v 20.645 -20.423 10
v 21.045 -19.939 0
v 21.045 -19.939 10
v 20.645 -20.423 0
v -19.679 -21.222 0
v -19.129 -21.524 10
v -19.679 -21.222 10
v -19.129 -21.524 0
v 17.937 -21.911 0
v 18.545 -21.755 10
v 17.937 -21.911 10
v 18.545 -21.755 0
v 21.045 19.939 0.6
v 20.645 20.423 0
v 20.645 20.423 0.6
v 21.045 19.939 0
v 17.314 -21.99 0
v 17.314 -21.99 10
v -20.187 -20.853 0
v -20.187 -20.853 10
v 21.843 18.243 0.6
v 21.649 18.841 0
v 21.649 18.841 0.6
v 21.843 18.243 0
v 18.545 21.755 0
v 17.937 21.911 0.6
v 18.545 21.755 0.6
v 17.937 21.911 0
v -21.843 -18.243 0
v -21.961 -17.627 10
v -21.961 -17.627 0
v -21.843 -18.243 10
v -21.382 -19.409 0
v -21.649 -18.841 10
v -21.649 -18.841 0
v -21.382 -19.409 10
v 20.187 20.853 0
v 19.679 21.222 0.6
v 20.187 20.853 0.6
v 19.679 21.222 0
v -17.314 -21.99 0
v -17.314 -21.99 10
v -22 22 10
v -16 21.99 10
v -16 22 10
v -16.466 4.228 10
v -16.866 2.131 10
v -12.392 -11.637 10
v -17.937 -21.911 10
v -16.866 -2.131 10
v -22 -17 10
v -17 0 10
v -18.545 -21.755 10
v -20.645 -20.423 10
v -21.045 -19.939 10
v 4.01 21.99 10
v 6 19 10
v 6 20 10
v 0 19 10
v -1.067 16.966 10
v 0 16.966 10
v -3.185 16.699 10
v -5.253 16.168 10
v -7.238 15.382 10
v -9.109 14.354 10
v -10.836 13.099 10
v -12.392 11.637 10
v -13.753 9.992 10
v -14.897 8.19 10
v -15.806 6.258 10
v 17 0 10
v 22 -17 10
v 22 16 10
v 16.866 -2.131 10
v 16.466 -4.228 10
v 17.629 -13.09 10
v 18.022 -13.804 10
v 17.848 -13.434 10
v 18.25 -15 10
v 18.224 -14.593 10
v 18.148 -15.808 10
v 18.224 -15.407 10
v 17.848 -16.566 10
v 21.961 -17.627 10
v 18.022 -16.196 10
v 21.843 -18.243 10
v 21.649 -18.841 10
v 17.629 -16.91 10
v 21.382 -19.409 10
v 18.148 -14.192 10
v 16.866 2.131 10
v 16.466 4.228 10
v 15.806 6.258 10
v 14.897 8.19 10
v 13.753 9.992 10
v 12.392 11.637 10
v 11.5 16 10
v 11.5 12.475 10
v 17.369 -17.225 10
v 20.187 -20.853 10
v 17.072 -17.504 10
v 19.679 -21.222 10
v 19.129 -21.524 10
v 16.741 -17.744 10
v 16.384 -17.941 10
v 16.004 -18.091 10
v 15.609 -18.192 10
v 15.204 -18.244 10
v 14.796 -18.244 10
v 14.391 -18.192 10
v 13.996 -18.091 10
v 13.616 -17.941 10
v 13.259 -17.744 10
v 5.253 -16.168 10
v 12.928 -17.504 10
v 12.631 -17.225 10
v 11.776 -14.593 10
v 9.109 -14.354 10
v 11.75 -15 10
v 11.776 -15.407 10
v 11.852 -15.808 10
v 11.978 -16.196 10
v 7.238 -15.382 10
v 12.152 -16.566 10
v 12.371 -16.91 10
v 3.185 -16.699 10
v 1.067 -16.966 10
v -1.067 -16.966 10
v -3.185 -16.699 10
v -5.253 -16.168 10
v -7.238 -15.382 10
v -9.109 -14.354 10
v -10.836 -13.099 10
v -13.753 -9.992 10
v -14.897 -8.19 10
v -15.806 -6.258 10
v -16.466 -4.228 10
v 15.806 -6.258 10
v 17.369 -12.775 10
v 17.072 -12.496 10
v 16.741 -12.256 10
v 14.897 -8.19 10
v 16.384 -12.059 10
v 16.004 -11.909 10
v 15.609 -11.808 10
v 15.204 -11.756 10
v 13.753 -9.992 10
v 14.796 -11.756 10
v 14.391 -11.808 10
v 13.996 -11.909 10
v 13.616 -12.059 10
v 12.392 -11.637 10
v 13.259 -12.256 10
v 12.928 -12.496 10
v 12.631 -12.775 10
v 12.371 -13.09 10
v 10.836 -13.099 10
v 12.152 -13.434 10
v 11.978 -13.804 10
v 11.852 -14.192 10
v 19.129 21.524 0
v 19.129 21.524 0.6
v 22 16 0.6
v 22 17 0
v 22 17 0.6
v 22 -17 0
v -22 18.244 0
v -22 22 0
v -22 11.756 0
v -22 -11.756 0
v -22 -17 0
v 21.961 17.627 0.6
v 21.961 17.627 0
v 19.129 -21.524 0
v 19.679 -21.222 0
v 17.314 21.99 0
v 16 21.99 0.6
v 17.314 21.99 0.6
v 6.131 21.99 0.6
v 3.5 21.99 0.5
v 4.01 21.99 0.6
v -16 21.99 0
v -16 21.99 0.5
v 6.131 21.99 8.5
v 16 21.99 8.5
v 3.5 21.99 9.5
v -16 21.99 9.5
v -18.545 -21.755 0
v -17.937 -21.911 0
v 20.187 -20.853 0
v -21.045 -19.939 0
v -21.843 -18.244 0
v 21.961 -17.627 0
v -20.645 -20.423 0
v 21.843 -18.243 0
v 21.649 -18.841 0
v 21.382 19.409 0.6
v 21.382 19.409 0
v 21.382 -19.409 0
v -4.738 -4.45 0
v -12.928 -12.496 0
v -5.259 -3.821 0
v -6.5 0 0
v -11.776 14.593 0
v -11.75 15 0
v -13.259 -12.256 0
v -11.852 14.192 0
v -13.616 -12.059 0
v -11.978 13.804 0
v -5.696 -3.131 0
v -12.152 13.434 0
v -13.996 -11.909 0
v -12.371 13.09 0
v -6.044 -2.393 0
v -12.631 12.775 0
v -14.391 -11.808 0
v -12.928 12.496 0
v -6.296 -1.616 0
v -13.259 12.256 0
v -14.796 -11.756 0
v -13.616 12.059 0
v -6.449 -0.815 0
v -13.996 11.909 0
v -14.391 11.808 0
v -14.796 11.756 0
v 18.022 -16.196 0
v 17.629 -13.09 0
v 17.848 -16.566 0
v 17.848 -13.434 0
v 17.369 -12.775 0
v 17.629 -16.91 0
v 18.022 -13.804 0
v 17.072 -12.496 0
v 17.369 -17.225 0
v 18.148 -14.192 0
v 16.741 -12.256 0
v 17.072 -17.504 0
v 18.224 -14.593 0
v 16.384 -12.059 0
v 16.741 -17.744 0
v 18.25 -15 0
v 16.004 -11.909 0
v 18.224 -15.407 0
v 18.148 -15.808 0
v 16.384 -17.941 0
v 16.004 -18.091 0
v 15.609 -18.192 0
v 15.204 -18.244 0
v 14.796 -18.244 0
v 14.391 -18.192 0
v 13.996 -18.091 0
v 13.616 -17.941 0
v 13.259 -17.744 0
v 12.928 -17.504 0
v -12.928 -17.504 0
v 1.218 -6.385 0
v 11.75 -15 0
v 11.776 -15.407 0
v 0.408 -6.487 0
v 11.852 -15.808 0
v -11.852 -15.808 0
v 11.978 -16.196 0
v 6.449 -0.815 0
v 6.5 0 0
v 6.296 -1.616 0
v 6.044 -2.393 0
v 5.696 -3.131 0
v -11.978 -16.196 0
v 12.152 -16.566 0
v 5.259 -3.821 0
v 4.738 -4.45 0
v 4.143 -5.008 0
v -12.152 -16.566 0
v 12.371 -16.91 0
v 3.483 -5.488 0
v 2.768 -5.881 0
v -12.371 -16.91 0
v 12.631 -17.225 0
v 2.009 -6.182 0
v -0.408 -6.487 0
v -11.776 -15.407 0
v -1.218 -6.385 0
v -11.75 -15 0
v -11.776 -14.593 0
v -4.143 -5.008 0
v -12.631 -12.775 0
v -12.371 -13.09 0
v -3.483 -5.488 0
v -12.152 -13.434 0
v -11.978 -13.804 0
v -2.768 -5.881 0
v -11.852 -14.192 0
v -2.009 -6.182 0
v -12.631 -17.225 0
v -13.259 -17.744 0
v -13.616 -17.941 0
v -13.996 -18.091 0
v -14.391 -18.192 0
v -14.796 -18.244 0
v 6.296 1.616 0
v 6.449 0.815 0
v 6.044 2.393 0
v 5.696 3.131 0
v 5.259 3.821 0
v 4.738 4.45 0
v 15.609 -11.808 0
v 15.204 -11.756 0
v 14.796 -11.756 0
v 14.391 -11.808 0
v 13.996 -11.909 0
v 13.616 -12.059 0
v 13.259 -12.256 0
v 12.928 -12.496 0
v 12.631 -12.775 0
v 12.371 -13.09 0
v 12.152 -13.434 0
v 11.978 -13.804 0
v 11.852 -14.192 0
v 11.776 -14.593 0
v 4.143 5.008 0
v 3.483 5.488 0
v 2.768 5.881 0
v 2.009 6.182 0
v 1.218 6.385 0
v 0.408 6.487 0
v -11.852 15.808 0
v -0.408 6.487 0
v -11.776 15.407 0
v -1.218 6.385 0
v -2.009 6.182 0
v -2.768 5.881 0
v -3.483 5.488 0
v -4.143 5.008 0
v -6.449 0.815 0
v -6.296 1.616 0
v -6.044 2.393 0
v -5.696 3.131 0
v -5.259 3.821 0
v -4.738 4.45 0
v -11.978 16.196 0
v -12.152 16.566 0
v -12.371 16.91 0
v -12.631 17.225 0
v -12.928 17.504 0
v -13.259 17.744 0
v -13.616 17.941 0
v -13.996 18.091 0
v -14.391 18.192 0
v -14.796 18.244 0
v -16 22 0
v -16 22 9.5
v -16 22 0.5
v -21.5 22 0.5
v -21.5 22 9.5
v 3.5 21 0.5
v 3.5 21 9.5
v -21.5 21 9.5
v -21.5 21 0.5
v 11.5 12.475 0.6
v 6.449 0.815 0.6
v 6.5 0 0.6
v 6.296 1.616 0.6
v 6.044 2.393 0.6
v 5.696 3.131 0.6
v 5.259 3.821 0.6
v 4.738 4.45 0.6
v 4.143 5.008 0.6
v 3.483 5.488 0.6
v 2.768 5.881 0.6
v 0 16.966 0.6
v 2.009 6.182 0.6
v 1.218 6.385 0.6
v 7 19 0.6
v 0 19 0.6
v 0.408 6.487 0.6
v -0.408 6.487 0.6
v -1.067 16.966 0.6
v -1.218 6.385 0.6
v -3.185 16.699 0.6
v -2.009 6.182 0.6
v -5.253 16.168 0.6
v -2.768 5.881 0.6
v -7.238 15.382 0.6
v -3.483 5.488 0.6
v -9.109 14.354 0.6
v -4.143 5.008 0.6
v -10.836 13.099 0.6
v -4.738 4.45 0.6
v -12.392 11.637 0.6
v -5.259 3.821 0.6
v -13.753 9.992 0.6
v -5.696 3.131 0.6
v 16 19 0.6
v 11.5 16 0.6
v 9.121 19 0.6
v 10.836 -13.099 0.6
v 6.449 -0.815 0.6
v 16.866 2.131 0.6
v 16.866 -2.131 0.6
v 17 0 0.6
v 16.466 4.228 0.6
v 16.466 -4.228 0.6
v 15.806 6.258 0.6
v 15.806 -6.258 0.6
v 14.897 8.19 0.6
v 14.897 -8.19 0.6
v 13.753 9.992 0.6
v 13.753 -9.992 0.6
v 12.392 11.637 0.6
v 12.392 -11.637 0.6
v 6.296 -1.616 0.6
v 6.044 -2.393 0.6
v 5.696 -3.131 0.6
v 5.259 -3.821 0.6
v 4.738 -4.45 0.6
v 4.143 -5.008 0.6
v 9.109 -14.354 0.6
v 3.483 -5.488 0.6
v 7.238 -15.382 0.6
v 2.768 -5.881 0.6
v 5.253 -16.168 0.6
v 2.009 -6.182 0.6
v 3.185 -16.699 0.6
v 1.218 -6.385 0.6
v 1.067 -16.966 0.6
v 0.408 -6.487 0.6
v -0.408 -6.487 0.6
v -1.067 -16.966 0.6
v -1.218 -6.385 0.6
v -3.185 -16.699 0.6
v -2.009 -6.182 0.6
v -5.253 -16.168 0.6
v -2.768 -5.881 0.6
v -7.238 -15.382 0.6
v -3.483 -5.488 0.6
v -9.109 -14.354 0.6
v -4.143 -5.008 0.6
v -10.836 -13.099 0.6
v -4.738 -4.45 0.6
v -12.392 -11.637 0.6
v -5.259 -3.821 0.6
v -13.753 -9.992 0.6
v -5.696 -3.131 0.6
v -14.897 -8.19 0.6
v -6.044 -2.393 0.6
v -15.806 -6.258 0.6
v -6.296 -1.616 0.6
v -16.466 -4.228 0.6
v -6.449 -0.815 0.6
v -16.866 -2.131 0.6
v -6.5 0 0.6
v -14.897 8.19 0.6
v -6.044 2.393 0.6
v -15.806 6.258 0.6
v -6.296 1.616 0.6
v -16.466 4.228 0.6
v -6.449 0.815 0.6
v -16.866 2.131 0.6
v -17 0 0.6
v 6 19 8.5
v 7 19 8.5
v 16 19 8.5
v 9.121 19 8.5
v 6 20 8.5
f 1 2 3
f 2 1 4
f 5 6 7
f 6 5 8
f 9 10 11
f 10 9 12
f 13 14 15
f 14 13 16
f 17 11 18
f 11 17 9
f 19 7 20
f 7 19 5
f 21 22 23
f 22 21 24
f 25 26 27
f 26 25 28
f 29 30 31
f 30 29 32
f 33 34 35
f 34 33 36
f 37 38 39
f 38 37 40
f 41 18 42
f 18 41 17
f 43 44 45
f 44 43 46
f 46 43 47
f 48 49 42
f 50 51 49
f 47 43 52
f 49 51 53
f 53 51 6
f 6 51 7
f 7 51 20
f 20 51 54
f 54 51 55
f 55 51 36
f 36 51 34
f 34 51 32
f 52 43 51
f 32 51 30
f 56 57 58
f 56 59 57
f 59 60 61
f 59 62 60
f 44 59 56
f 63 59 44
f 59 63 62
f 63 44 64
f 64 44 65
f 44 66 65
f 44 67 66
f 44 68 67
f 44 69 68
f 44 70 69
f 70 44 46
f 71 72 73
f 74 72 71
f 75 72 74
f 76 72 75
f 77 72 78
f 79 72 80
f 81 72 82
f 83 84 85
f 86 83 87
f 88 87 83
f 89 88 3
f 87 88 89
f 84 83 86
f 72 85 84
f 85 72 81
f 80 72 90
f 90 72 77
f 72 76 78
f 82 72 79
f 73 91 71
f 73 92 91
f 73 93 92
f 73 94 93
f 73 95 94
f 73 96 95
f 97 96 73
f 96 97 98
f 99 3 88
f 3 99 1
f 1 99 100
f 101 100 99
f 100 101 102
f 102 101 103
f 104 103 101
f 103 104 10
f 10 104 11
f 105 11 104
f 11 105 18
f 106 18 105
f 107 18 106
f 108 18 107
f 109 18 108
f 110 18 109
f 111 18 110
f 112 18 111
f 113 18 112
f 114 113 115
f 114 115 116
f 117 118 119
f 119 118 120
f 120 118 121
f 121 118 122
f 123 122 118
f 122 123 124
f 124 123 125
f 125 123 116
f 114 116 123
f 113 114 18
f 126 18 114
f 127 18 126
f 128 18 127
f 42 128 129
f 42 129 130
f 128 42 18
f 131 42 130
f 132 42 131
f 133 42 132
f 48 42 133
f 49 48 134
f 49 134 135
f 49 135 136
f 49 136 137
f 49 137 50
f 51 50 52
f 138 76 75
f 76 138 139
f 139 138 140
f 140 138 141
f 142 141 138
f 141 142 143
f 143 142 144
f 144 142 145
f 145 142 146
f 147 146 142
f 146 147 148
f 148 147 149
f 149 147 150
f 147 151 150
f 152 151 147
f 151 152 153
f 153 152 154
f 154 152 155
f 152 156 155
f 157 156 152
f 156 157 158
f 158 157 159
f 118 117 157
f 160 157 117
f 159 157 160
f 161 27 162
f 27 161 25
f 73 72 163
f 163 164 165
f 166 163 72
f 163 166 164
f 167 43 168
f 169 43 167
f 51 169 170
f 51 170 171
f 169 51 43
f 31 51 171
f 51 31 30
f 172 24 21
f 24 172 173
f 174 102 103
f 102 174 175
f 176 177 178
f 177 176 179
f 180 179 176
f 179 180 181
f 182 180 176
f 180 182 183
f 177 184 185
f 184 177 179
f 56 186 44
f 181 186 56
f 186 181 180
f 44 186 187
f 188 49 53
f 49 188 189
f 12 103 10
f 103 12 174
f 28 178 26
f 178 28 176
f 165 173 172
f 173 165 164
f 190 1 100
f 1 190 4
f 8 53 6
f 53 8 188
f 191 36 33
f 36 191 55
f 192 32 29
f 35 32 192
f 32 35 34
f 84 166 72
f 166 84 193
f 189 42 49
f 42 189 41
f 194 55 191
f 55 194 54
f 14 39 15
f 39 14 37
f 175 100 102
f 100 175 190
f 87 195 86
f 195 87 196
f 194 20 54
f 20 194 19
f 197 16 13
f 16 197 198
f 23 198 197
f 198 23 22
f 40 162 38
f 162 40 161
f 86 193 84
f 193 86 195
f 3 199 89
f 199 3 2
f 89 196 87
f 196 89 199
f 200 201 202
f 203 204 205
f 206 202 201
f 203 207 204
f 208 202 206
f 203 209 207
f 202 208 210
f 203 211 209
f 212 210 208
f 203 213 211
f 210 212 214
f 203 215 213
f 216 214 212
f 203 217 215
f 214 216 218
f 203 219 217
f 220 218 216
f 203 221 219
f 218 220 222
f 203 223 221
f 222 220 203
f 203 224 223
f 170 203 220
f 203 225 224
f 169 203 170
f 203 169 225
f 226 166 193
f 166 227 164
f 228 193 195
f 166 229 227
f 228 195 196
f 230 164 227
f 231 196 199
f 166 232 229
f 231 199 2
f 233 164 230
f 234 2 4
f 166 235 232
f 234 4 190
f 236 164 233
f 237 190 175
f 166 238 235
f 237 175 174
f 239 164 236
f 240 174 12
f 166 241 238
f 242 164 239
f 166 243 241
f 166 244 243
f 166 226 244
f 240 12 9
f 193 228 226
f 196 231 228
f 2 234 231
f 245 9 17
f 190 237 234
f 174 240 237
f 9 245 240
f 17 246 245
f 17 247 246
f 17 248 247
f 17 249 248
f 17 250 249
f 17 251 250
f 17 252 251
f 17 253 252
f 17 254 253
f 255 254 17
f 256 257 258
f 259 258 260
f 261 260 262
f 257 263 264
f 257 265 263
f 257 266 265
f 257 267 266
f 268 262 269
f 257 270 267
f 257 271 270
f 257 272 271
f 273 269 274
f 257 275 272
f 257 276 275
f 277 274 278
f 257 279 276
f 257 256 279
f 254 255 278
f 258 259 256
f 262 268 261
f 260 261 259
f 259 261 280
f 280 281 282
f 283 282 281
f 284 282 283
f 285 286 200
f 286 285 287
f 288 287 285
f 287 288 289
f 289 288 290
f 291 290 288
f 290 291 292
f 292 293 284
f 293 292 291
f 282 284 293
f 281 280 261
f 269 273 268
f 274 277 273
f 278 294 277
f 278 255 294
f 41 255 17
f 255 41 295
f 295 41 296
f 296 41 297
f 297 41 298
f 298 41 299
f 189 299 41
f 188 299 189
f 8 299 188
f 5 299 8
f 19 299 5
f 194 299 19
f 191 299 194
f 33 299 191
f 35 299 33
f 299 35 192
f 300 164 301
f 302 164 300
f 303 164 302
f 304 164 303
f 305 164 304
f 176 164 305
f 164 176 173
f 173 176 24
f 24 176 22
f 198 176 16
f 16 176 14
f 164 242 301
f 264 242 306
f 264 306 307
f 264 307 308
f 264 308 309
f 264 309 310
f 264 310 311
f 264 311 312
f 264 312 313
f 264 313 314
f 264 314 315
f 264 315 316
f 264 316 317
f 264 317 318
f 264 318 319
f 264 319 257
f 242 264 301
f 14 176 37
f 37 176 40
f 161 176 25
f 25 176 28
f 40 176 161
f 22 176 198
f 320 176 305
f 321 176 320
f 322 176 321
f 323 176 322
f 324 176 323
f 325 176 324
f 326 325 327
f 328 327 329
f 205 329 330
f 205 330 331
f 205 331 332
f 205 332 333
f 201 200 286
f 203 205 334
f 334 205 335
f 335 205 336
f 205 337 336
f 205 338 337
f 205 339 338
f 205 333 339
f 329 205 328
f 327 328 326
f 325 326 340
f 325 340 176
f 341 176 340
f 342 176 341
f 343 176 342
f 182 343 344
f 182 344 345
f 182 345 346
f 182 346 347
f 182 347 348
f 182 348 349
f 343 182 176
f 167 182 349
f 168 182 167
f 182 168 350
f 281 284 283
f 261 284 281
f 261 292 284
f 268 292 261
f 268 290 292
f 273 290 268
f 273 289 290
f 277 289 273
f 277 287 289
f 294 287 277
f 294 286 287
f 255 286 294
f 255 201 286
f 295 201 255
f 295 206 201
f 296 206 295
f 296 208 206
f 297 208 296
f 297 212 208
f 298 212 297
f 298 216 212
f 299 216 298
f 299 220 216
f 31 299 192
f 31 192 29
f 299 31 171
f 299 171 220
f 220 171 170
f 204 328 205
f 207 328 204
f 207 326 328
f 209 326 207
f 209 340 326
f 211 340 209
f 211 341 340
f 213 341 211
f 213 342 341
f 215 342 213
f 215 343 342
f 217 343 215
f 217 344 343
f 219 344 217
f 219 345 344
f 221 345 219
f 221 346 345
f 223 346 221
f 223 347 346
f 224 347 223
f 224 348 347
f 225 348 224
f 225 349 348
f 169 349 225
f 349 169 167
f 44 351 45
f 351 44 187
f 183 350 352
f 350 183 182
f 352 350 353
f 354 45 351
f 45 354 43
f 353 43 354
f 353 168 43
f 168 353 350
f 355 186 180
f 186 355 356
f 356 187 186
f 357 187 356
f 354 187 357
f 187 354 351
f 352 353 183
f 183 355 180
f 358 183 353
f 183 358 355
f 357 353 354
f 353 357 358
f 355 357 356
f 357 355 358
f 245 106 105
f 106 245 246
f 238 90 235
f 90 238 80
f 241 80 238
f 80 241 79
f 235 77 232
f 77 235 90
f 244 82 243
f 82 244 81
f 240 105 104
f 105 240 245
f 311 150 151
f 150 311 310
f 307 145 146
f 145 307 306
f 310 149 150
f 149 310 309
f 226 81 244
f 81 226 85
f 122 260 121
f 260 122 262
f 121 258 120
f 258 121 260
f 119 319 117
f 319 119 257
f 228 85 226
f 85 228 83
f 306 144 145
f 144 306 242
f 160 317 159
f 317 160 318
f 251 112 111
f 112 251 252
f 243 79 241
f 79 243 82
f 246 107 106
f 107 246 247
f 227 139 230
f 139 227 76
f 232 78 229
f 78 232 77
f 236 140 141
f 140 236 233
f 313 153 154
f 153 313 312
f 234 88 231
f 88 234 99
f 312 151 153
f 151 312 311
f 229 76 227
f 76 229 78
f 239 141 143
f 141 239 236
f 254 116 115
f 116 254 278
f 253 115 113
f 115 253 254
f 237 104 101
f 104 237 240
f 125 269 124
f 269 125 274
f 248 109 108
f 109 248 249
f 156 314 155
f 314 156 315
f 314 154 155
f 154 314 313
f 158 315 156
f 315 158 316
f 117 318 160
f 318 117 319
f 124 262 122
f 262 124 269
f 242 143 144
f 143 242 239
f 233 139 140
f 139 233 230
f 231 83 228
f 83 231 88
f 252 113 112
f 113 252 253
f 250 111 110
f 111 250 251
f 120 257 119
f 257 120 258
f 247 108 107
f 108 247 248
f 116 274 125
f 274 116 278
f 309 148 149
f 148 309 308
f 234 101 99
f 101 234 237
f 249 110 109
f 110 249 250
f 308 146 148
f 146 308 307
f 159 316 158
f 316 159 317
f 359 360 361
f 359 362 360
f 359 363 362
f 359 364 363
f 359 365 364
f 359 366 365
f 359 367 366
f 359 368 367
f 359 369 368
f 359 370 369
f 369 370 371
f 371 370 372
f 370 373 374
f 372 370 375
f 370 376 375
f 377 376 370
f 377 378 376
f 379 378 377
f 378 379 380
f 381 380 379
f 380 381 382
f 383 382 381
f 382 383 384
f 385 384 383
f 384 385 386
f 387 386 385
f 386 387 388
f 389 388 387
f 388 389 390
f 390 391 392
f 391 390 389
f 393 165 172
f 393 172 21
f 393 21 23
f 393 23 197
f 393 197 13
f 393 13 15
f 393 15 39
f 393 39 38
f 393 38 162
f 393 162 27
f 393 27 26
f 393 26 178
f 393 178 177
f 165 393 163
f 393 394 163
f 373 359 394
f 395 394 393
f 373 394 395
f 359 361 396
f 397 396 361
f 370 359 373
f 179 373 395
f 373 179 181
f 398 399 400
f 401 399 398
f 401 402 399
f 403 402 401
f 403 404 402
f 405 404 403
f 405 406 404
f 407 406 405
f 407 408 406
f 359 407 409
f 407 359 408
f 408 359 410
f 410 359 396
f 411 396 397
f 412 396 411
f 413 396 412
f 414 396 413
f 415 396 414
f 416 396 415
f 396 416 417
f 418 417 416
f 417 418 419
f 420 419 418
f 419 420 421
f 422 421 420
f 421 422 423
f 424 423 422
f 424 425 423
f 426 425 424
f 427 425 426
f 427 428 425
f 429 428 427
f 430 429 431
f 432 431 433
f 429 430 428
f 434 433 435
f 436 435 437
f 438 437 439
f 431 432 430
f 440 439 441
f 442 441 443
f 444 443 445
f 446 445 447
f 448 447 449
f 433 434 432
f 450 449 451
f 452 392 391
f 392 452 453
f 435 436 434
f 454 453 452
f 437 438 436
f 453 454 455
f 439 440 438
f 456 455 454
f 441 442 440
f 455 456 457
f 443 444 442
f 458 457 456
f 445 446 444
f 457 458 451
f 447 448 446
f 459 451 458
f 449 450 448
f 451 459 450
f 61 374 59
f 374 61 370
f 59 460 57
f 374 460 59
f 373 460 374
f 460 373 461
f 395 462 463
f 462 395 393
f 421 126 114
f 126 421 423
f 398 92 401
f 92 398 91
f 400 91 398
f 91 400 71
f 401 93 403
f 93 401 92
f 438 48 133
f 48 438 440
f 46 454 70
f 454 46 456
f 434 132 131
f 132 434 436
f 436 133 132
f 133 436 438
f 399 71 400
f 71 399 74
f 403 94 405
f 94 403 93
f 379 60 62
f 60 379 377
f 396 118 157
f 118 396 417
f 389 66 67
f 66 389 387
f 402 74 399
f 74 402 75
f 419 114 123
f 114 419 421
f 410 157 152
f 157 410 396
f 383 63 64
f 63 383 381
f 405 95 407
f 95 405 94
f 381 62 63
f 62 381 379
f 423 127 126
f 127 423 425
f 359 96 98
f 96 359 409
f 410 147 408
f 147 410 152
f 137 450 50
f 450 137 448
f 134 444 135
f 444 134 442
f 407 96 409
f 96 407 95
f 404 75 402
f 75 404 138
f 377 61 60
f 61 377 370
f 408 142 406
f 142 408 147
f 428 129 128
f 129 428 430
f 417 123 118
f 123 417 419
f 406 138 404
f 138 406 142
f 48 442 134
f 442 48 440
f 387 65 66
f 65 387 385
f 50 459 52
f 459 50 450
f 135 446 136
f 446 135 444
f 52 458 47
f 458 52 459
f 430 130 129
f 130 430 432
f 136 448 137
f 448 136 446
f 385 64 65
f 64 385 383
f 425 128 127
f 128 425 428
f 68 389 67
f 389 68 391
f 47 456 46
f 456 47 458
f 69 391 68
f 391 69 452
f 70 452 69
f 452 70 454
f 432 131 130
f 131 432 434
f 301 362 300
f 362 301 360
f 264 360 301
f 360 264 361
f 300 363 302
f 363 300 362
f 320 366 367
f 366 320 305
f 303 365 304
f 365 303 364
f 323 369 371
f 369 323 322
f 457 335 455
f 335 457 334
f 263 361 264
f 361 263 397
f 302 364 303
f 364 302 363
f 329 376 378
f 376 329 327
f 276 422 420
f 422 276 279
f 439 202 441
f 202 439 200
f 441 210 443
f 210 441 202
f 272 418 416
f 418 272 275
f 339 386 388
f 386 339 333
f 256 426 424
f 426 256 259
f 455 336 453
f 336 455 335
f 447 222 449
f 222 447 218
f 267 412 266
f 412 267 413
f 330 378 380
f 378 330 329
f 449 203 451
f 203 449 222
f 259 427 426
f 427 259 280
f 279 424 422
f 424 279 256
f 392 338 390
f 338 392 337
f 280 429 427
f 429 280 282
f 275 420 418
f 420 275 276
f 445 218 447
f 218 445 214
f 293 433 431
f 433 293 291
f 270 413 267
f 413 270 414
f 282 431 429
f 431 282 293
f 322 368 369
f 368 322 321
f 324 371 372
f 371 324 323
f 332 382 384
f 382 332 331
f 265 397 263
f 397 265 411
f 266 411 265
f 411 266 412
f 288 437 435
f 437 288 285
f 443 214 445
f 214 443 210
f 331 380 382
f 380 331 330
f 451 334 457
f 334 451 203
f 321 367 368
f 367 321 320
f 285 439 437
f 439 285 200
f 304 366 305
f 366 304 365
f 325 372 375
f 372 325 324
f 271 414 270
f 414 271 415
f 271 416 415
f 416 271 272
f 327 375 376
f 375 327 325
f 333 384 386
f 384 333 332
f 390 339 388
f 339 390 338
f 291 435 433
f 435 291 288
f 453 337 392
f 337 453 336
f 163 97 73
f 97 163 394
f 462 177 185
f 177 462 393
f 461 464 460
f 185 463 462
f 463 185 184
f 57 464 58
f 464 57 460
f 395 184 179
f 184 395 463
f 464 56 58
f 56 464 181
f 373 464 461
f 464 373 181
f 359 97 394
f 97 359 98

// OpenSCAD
$fn = 50;


difference() {
	union() {
		hull() {
			translate(v = [-17.0000000000, 17.0000000000, 0]) {
				cylinder(h = 10, r = 5);
			}
			translate(v = [17.0000000000, 17.0000000000, 0]) {
				cylinder(h = 10, r = 5);
			}
			translate(v = [-17.0000000000, -17.0000000000, 0]) {
				cylinder(h = 10, r = 5);
			}
			translate(v = [17.0000000000, -17.0000000000, 0]) {
				cylinder(h = 10, r = 5);
			}
		}
		translate(v = [-22.0000000000, 16.0000000000, 0]) {
			cube(size = [6, 6, 10]);
		}
	}
	union() {
		translate(v = [-22.5000000000, -15.0000000000, -250.0000000000]) {
			rotate(a = [0, 0, 0]) {
				difference() {
					union() {
						hull() {
							translate(v = [7.5000000000, 0, 0]) {
								cylinder(h = 250, r = 3.2500000000, r1 = 3.2500000000, r2 = 3.2500000000);
							}
							translate(v = [-7.5000000000, 0, 0]) {
								cylinder(h = 250, r = 3.2500000000, r1 = 3.2500000000, r2 = 3.2500000000);
							}
						}
					}
					union();
				}
			}
		}
		translate(v = [-22.5000000000, 15.0000000000, -250.0000000000]) {
			rotate(a = [0, 0, 0]) {
				difference() {
					union() {
						hull() {
							translate(v = [7.5000000000, 0, 0]) {
								cylinder(h = 250, r = 3.2500000000, r1 = 3.2500000000, r2 = 3.2500000000);
							}
							translate(v = [-7.5000000000, 0, 0]) {
								cylinder(h = 250, r = 3.2500000000, r1 = 3.2500000000, r2 = 3.2500000000);
							}
						}
					}
					union();
				}
			}
		}
		translate(v = [-21.5000000000, 21.0000000000, 0.5000000000]) {
			cube(size = [25, 1, 9.0000000000]);
		}
		translate(v = [15.0000000000, -15.0000000000, -50.0000000000]) {
			cylinder(h = 100, r = 3.2500000000);
		}
		translate(v = [0.0000000000, 11.0000000000, 0.6000000000]) {
			cube(size = [11, 8, 12.4000000000]);
		}
		translate(v = [0, 0, 0.6000000000]) {
			cylinder(h = 12.4000000000, r = 17.0000000000);
		}
		translate(v = [0, 0, -5.0000000000]) {
			cylinder(h = 10, r = 6.5000000000);
		}
		translate(v = [0.0000000000, 16.0000000000, 0.6000000000]) {
			cube(size = [22.0000000000, 3, 12.4000000000]);
		}
		translate(v = [16.0000000000, 16.0000000000, 0.6000000000]) {
			cube(size = [6, 6, 12.4000000000]);
		}
		translate(v = [6.0000000000, 16.0000000000, 8.5000000000]) {
			cube(size = [16, 6, 1.5000000000]);
		}
		translate(v = [3.2500000000, 22.7500000000, 0.6000000000]) {
			rotate(a = [0, 0, -45]) {
				cube(size = [7.5000000000, 1.5000000000, 12.4000000000]);
			}
		}
		translate(v = [2.5000000000, 11.0000000000, 0.6000000000]) {
			cube(size = [9.0000000000, 5, 9.4000000000]);
		}
	}
}
